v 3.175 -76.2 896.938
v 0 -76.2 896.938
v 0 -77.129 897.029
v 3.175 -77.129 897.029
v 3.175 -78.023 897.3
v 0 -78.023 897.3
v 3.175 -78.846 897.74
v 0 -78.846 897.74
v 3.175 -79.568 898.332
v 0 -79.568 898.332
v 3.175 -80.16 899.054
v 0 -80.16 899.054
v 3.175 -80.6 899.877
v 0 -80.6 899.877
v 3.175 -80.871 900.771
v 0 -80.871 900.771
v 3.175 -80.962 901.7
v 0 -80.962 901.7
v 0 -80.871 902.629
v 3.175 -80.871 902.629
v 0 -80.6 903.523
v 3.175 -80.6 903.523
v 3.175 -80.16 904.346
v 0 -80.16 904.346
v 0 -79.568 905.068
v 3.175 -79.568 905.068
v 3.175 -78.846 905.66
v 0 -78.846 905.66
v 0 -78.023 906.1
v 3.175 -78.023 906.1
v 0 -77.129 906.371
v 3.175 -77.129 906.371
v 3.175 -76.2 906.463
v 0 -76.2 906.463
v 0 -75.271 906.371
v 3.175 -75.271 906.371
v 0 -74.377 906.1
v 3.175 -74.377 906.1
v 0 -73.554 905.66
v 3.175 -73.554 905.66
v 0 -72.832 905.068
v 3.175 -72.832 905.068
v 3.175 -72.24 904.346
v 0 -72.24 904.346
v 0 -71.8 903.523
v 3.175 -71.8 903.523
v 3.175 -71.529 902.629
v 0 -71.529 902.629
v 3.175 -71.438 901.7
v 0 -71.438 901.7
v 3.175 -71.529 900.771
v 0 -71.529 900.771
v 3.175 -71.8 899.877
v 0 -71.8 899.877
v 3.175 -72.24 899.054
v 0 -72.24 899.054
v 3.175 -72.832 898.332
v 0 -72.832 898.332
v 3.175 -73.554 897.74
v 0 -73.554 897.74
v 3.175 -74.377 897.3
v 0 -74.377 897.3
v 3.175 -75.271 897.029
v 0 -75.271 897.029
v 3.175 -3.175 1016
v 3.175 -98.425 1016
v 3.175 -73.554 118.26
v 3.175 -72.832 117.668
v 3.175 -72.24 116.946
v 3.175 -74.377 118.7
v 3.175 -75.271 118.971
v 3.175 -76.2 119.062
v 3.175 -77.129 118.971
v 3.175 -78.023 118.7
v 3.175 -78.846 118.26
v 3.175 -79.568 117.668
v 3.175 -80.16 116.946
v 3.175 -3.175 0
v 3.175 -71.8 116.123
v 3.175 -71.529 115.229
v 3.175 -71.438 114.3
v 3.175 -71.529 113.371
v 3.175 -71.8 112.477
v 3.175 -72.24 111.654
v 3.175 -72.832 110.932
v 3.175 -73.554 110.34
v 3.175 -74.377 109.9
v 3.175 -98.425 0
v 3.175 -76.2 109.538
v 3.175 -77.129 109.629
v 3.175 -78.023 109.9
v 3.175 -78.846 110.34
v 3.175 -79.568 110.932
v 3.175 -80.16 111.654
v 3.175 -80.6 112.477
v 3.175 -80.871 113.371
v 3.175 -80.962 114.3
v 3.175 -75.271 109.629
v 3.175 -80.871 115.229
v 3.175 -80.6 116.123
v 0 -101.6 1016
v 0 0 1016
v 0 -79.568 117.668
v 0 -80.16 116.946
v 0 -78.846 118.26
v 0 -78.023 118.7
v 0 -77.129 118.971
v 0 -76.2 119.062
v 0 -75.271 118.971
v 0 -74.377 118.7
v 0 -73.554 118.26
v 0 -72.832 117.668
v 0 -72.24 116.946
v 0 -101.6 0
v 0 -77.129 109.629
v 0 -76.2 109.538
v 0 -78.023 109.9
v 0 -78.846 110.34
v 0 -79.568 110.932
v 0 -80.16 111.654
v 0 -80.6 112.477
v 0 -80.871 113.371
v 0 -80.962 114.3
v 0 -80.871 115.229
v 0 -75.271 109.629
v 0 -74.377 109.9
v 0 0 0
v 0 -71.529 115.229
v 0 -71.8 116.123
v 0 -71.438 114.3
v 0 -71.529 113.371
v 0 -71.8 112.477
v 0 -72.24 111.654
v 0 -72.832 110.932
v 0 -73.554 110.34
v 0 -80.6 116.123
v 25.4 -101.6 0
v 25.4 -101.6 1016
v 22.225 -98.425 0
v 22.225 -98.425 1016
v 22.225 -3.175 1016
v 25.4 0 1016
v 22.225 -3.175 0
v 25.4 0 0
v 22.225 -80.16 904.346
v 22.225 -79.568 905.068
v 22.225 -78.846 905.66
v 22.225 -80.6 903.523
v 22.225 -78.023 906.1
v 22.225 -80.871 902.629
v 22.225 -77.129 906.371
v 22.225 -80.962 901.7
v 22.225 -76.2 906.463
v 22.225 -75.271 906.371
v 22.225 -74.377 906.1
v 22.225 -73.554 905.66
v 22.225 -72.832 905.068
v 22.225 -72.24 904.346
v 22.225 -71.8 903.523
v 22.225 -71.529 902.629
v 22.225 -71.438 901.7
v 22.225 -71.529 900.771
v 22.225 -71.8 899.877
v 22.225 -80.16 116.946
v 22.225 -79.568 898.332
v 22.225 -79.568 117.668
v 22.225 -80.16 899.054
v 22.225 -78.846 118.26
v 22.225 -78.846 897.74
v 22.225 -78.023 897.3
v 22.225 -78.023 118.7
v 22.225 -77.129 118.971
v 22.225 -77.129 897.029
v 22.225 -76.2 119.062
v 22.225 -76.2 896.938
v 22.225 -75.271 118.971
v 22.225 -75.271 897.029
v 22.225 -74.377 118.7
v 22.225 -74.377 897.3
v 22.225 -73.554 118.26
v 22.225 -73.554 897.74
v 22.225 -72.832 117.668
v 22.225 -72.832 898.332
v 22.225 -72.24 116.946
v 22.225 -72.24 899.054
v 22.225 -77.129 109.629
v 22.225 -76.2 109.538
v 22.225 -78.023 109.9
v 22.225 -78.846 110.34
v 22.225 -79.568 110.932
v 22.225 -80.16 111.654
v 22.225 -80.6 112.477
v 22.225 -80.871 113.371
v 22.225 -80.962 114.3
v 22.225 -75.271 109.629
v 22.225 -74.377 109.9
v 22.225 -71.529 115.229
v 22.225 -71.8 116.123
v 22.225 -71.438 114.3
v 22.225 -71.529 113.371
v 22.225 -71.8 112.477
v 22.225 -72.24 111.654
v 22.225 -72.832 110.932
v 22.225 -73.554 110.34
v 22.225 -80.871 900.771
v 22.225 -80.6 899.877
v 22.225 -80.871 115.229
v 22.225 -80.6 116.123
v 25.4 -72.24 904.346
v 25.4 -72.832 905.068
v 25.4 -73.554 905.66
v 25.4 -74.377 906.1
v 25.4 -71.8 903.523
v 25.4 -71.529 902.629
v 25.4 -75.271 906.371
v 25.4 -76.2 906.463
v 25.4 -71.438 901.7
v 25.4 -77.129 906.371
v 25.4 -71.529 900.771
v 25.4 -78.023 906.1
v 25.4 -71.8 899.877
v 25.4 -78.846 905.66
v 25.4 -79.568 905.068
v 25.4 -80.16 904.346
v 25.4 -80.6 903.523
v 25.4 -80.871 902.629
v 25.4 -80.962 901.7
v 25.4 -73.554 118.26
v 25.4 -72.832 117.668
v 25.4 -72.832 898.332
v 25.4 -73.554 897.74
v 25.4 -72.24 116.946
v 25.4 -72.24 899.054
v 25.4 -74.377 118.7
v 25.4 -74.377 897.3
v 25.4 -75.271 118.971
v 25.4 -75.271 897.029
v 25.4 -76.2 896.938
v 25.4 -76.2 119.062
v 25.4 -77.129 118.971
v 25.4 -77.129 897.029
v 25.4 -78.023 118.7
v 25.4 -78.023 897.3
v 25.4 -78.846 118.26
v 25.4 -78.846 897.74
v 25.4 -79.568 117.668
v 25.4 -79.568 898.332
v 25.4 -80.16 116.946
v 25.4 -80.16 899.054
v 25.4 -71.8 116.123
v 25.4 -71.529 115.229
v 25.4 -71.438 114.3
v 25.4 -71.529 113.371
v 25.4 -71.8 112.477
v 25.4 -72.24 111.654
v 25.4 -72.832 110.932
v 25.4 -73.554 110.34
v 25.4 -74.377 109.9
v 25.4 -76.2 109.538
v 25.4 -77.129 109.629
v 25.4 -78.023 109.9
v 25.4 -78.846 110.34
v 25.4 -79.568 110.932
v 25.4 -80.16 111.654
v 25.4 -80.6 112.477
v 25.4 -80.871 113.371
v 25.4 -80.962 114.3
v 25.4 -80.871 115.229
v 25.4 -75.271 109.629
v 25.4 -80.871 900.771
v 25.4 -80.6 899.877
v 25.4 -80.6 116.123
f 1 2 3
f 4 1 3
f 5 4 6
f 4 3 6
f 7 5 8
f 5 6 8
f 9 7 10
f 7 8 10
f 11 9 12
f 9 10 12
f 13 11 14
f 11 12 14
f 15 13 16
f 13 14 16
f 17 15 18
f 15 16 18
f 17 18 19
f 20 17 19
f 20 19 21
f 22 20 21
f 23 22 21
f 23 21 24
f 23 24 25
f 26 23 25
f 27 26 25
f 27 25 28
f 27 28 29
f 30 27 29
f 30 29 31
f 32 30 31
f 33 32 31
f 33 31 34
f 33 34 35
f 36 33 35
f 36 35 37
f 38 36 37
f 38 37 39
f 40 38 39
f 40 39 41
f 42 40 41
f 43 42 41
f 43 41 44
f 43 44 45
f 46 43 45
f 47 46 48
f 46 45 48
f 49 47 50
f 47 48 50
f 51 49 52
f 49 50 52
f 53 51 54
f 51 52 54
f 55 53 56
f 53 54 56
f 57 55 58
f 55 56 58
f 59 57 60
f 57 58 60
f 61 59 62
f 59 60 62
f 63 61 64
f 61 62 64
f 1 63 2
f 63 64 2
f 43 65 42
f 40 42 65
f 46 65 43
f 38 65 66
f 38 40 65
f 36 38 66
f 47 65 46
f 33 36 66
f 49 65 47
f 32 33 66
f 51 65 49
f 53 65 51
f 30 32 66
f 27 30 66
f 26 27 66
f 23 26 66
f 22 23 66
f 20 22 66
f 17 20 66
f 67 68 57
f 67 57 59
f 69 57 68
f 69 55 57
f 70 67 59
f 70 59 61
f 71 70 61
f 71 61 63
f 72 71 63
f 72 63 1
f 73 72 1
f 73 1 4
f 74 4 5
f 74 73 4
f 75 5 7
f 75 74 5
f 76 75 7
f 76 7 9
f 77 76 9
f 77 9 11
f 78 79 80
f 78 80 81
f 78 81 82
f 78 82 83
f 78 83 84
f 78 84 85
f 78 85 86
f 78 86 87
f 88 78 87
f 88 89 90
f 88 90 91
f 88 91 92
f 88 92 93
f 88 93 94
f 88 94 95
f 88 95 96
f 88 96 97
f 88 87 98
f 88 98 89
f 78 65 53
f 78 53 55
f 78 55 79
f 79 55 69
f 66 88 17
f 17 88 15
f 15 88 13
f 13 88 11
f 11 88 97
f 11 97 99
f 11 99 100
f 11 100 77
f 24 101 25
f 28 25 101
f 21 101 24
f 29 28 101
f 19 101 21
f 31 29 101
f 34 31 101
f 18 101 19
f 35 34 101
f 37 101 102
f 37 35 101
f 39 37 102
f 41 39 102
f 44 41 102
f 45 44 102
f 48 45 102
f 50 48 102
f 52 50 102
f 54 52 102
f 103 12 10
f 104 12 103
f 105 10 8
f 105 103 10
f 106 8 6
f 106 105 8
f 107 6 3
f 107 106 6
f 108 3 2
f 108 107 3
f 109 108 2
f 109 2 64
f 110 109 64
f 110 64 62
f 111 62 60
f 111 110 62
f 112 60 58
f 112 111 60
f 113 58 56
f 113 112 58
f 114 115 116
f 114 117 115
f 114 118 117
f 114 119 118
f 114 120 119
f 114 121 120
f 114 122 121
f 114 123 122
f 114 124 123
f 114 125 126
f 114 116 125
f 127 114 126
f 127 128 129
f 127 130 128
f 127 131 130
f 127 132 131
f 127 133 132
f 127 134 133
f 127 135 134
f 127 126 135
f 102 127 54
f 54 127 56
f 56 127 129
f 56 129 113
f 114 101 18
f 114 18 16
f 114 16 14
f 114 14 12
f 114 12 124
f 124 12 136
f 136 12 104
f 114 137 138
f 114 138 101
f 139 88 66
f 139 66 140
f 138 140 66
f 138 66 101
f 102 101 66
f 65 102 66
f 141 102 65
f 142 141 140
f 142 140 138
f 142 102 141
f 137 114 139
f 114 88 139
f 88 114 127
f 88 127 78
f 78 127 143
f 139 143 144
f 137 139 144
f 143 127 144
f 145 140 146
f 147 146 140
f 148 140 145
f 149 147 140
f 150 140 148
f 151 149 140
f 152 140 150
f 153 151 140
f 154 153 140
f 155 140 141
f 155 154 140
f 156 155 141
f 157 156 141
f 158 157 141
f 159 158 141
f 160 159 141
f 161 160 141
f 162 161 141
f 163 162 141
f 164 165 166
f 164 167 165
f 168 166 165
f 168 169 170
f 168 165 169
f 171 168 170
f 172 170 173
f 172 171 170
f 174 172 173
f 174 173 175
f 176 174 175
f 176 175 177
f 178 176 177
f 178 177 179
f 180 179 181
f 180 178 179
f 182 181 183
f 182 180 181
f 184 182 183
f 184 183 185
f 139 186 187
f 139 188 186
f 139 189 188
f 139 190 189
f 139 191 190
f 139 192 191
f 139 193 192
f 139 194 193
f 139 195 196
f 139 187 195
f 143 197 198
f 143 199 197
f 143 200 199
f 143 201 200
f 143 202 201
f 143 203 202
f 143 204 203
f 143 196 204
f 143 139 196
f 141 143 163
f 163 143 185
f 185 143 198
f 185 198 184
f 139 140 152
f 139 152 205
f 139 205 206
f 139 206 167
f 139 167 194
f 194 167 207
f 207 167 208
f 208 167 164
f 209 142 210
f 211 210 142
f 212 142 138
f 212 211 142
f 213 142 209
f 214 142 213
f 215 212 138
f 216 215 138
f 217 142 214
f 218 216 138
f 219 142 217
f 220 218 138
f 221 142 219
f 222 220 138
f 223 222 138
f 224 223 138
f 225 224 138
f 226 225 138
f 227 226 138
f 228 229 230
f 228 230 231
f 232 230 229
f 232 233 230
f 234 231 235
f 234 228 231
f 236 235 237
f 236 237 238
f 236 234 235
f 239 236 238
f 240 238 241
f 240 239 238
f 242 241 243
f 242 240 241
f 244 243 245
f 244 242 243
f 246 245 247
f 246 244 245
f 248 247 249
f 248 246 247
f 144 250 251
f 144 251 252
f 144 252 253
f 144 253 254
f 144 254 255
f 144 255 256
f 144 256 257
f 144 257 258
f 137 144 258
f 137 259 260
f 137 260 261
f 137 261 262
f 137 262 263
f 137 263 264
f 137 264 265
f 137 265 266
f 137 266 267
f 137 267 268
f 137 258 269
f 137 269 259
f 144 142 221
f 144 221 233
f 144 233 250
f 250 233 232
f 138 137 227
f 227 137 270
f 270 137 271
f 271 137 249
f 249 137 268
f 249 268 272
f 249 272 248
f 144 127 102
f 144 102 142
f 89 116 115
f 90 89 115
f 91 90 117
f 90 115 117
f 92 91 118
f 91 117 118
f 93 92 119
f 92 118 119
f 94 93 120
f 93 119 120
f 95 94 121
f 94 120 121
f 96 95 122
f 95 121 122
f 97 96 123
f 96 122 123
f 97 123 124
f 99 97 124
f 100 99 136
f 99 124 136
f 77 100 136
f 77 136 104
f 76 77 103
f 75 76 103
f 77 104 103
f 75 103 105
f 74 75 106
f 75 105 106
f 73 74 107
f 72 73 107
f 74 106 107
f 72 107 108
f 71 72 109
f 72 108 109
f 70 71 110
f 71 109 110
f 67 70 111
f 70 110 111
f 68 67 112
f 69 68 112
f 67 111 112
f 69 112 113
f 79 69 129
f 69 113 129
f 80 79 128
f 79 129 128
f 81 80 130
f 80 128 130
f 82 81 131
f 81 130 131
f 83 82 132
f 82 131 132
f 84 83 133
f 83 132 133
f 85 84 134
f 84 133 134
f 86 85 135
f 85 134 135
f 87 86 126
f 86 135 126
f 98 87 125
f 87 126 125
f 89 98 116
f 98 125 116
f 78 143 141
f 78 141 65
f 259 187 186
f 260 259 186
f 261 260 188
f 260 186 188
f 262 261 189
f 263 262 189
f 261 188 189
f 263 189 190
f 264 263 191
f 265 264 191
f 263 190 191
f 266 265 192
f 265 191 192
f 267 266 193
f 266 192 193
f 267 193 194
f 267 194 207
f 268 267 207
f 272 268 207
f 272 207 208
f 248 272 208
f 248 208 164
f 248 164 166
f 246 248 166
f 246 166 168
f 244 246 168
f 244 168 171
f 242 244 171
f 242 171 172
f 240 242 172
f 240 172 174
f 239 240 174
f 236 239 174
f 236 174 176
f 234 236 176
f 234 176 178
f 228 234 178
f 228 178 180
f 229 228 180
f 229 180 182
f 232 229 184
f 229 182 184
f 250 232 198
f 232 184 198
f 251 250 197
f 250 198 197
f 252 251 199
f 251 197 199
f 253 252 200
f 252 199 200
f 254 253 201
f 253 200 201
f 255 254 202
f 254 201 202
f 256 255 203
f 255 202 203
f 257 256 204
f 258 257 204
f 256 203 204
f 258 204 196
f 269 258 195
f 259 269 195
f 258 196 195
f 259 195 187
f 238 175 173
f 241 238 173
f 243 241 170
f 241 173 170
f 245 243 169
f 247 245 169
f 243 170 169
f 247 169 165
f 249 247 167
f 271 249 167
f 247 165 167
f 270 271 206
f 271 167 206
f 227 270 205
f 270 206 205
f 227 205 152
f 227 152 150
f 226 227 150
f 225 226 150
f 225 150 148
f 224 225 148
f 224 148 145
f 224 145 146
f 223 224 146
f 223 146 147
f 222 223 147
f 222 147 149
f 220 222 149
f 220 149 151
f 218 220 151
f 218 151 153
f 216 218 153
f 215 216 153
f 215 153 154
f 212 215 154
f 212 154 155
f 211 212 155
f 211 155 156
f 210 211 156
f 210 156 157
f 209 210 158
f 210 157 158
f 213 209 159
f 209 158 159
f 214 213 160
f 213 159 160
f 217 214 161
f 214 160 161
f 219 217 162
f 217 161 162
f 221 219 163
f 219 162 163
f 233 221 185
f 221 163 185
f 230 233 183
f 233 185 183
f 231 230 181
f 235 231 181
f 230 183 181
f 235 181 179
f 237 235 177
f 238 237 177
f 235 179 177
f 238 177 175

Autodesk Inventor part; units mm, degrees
ref_plane "YZ Plane" through (0, 0, 0) normal (1, 0, 0) x (0, 1, 0)
ref_plane "XZ Plane" through (0, 0, 0) normal (0, 1, 0) x (-1, 0, 0)
ref_plane "XY Plane" through (0, 0, 0) normal (0, 0, 1) x (1, 0, 0)
sketch "Sketch1" plane through (0, 0, 0) normal (0, 0, 1) x (1, 0, 0)
  line L0 (0, 0) -> (25.4, 0)
  line L1 (25.4, 0) -> (25.4, -101.6)
  line L2 (25.4, -101.6) -> (0, -101.6)
  line L3 (0, -101.6) -> (0, 0)
  line L4 (22.225, -3.175) -> (3.175, -3.175)
  line L5 (3.175, -3.175) -> (3.175, -98.425)
  line L6 (3.175, -98.425) -> (22.225, -98.425)
  line L7 (22.225, -98.425) -> (22.225, -3.175)
  dimension "d0" = 25.4
  dimension "d1" = 101.6
  dimension "d2" = 3.175
extrude "Extrusion1" add sketch "Sketch1" along normal blind 1016
sketch "Sketch2" plane through (25.4, -101.6, 0) normal (1, 0, 0) x (0, 0, -1)
  point P0 (0, 101.6)
  point P1 (-114.3, 25.4)
sketch "Sketch3" plane through (25.4, -101.6, 0) normal (1, 0, 0) x (0, 0, -1)
  point P0 (0, 101.6)
  point P1 (-901.7, 25.4)
hole "Hole1" at (25.4, -76.2, 901.7) direction (-1, 0, 0) diameter 9.525 end through all
hole "Hole2" at (25.4, -76.2, 114.3) direction (-1, 0, 0) diameter 9.525 end through all
properties part number "4x1 boxbeam"
